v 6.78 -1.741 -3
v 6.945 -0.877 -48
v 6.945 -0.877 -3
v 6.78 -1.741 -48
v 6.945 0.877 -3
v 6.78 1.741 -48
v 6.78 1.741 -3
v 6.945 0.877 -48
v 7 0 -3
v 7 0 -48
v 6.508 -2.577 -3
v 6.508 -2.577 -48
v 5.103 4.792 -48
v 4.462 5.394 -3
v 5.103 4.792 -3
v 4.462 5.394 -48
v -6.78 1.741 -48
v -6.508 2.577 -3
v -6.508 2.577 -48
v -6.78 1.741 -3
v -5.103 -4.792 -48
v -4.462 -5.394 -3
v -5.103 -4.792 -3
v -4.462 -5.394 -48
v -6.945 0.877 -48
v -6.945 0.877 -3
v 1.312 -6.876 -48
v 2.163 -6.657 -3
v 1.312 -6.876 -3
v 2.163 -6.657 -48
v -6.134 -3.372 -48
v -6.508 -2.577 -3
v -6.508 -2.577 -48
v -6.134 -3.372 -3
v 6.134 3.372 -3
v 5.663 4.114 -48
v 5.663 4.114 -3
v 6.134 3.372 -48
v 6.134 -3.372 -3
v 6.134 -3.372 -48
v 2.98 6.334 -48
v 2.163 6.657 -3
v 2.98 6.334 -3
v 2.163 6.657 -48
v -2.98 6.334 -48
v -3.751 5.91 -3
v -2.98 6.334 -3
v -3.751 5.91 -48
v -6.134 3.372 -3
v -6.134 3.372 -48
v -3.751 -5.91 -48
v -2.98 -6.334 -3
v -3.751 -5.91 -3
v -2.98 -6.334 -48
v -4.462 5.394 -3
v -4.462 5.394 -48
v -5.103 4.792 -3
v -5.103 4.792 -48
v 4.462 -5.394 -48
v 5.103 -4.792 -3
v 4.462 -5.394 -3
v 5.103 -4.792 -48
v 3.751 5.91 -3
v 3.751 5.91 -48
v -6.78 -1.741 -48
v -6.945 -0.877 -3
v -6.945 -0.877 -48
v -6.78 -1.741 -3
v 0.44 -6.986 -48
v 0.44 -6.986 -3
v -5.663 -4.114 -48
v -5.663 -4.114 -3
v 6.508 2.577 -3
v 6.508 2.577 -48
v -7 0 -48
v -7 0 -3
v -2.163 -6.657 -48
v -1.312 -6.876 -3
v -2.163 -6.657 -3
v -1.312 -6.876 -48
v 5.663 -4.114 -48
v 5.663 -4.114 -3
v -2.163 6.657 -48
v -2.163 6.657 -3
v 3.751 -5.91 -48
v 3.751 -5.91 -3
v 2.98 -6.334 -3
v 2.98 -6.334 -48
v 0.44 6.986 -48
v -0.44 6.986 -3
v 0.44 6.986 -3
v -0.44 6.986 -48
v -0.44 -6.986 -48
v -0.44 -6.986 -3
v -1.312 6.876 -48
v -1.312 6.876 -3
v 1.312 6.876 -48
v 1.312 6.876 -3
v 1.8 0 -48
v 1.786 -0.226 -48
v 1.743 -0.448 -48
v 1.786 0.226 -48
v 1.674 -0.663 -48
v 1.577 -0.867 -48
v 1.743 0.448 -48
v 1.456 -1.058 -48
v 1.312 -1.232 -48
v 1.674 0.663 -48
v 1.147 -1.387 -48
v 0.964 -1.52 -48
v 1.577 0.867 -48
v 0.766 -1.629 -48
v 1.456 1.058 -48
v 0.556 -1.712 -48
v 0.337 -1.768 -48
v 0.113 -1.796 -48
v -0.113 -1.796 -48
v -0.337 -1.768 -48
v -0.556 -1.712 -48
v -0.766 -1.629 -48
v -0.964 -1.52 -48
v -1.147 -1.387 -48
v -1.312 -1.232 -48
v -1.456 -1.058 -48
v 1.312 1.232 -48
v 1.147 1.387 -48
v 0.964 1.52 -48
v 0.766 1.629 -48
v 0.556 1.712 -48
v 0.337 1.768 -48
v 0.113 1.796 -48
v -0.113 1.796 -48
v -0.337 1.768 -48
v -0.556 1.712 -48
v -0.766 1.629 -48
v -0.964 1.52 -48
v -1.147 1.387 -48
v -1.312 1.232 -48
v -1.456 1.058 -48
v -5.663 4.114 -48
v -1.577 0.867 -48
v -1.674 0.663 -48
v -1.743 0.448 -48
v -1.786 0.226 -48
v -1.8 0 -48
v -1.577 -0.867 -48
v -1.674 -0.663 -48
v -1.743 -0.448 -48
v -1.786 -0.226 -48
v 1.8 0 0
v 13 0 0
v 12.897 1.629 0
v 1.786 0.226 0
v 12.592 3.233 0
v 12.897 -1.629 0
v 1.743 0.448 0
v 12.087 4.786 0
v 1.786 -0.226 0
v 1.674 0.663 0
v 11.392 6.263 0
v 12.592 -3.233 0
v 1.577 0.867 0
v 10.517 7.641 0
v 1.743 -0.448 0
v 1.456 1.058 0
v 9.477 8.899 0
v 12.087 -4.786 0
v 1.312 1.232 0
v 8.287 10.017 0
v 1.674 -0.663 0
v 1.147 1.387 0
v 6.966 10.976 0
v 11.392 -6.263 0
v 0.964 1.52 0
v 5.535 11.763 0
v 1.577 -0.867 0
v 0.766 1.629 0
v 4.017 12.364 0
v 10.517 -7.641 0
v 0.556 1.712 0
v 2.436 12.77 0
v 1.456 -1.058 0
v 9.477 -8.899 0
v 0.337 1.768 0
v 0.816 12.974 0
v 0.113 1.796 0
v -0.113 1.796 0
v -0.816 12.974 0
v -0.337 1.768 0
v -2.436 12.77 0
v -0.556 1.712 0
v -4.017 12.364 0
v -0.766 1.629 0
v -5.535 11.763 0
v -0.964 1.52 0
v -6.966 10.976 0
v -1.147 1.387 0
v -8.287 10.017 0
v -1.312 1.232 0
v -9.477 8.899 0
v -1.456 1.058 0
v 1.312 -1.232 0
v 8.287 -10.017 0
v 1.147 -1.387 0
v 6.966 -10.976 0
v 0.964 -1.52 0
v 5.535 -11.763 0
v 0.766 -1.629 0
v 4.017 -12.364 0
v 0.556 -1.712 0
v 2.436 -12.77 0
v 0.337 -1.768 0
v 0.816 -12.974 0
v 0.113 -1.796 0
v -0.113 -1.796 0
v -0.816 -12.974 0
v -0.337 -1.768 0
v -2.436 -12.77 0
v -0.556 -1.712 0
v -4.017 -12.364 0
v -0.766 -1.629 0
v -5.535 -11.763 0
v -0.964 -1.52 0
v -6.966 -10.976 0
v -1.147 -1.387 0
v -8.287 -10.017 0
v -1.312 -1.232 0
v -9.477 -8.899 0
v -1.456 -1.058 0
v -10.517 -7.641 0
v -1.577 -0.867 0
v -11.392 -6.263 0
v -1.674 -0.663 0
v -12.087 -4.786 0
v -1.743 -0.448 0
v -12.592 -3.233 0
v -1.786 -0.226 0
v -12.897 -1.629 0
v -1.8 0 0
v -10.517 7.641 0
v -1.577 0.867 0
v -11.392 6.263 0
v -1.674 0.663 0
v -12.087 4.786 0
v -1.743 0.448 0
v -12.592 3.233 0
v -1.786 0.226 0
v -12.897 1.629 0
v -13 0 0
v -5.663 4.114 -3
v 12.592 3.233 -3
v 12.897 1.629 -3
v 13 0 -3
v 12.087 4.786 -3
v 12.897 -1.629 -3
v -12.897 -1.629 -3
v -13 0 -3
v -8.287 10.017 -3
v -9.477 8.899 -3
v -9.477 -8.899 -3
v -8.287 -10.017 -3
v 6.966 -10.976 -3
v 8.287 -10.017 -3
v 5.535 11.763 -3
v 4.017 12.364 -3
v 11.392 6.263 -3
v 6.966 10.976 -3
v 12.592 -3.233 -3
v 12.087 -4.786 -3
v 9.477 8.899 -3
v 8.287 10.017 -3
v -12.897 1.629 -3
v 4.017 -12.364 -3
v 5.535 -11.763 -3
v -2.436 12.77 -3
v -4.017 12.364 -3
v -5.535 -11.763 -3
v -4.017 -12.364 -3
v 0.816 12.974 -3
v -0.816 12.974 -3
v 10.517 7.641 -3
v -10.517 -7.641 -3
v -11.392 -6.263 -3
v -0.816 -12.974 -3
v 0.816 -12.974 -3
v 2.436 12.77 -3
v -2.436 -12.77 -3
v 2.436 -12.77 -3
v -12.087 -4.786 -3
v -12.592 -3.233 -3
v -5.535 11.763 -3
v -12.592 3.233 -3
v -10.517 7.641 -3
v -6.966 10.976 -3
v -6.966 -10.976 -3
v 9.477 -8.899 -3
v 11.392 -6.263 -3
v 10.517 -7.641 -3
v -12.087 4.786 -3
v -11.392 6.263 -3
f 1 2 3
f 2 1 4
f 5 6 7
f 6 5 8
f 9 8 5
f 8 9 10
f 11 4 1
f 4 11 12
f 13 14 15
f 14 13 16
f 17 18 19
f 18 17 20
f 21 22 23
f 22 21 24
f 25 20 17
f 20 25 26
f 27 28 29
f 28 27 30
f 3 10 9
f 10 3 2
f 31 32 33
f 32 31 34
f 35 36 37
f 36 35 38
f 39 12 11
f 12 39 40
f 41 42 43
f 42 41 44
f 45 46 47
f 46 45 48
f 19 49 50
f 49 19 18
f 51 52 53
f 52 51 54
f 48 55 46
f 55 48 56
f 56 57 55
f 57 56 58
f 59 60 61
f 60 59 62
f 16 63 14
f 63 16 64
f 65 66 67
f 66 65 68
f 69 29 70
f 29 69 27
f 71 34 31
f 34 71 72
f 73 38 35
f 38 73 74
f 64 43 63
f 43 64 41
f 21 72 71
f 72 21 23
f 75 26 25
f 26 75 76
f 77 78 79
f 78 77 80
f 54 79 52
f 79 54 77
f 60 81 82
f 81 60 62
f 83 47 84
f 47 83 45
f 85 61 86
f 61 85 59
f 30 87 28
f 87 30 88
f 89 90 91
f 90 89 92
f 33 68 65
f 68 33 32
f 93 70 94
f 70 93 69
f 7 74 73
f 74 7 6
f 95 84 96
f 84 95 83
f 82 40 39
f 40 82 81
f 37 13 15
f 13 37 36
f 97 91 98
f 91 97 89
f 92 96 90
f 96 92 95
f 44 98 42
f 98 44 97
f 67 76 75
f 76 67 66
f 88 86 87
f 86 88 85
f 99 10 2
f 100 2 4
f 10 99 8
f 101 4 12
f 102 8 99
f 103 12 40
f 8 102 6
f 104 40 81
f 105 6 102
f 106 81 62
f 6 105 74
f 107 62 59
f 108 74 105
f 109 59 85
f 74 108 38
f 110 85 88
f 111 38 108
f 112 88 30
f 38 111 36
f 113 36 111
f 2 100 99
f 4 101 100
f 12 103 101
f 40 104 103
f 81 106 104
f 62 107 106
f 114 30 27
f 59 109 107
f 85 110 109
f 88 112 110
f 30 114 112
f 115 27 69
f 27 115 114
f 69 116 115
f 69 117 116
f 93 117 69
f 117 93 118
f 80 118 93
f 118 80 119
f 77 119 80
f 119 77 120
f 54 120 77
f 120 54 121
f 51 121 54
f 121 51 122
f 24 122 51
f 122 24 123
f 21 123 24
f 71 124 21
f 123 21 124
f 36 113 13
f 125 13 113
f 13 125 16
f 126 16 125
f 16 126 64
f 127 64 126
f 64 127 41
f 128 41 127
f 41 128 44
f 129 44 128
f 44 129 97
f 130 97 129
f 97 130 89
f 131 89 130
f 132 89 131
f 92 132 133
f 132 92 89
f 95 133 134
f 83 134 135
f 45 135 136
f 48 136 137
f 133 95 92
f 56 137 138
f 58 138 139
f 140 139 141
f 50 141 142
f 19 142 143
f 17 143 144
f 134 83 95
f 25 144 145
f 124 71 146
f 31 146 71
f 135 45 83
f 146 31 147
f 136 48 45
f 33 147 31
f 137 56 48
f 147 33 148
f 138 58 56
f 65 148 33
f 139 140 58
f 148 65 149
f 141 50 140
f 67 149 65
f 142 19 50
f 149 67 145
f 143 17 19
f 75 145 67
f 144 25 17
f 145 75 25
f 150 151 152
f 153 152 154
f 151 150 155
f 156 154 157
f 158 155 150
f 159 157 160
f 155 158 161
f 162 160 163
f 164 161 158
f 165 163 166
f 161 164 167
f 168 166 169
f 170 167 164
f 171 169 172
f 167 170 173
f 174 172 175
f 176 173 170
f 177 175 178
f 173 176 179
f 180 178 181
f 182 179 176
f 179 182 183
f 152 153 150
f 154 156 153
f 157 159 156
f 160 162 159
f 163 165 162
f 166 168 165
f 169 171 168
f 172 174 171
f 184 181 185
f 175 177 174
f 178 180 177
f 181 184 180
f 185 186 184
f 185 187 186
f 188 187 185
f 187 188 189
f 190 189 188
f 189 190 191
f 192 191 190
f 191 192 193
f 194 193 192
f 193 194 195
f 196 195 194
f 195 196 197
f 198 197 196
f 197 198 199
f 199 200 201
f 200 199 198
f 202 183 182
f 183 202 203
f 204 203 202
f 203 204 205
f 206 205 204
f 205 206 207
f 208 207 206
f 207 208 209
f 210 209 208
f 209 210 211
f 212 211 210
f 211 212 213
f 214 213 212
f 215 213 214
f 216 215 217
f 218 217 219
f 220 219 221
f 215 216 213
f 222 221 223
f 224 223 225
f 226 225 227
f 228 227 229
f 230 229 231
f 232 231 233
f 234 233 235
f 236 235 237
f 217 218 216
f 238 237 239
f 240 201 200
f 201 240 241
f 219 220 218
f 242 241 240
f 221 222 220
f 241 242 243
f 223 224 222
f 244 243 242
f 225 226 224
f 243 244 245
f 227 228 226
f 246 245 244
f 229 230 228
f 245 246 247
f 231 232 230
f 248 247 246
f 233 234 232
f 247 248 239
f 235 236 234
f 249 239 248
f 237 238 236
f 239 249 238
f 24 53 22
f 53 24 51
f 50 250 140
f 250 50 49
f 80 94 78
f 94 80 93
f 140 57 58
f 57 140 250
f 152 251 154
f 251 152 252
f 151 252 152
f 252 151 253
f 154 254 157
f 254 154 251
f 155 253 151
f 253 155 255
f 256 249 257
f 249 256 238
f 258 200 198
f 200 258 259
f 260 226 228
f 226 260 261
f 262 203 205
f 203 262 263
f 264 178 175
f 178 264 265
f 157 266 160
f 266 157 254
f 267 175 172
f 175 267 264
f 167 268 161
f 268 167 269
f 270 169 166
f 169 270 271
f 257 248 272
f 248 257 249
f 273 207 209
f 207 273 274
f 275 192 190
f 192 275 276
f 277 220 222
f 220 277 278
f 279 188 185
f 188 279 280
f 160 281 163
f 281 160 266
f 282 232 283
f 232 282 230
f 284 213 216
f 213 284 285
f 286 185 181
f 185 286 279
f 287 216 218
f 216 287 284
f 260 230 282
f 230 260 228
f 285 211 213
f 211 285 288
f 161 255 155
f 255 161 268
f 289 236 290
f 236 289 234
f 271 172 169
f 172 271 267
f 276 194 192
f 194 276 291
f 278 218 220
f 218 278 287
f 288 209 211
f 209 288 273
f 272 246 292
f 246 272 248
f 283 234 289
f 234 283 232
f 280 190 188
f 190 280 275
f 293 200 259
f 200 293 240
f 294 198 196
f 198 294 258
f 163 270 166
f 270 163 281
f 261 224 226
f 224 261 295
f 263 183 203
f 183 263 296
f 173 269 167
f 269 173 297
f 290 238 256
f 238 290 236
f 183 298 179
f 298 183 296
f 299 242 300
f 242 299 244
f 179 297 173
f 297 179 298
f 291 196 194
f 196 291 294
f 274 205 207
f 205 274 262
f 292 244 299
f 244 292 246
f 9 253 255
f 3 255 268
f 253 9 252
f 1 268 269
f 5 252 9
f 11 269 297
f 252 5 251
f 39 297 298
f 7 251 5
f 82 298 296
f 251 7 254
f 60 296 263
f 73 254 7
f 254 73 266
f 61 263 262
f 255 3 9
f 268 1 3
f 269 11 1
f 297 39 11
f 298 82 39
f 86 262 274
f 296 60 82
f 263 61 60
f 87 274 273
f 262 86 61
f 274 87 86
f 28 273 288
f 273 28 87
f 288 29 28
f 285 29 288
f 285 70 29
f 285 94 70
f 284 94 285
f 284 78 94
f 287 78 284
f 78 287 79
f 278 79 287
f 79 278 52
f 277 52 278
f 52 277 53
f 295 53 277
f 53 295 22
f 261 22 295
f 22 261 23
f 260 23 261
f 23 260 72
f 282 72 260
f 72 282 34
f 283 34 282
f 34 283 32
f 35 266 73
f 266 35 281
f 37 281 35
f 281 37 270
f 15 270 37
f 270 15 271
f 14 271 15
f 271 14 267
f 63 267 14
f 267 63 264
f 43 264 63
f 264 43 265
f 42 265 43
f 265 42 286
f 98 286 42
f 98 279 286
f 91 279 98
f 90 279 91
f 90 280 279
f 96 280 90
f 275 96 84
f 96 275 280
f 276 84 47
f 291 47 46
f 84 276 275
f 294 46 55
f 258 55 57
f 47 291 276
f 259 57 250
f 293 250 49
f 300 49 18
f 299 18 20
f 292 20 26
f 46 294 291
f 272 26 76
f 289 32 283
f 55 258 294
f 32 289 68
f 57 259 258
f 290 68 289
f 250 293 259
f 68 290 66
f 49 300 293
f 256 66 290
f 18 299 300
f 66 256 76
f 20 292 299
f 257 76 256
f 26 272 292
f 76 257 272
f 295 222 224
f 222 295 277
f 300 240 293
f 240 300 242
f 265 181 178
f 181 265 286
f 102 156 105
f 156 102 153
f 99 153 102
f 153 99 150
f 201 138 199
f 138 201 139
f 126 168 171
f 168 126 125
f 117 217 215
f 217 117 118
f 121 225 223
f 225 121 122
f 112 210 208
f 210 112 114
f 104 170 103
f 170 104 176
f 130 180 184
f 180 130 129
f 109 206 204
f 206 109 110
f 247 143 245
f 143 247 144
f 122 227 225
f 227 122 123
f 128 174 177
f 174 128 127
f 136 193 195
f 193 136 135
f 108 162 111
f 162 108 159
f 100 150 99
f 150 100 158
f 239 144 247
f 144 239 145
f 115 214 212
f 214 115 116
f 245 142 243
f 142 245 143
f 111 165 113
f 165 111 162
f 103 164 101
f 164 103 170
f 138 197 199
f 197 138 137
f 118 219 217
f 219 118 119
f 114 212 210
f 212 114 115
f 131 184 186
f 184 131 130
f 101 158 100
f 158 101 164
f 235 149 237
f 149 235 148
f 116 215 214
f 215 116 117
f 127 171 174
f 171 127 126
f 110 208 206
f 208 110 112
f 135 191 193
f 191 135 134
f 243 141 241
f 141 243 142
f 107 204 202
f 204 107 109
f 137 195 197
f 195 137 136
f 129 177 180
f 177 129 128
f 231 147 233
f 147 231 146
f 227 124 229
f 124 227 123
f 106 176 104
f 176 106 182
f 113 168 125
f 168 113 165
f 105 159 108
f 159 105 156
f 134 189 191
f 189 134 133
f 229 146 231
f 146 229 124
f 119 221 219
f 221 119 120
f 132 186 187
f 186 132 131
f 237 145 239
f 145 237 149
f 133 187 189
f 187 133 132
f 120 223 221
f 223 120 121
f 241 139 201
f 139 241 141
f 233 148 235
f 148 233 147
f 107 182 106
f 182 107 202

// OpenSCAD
$fn = 50;


difference() {
	union() {
		translate(v = [0, 0, -48.0000000000]) {
			cylinder(h = 48, r = 7.0000000000);
		}
		translate(v = [0, 0, -3.0000000000]) {
			cylinder(h = 3, r = 13.0000000000);
		}
	}
	union() {
		#translate(v = [0, 0, -48]) {
			cylinder(h = 48, r = 1.8000000000);
		}
	}
}
